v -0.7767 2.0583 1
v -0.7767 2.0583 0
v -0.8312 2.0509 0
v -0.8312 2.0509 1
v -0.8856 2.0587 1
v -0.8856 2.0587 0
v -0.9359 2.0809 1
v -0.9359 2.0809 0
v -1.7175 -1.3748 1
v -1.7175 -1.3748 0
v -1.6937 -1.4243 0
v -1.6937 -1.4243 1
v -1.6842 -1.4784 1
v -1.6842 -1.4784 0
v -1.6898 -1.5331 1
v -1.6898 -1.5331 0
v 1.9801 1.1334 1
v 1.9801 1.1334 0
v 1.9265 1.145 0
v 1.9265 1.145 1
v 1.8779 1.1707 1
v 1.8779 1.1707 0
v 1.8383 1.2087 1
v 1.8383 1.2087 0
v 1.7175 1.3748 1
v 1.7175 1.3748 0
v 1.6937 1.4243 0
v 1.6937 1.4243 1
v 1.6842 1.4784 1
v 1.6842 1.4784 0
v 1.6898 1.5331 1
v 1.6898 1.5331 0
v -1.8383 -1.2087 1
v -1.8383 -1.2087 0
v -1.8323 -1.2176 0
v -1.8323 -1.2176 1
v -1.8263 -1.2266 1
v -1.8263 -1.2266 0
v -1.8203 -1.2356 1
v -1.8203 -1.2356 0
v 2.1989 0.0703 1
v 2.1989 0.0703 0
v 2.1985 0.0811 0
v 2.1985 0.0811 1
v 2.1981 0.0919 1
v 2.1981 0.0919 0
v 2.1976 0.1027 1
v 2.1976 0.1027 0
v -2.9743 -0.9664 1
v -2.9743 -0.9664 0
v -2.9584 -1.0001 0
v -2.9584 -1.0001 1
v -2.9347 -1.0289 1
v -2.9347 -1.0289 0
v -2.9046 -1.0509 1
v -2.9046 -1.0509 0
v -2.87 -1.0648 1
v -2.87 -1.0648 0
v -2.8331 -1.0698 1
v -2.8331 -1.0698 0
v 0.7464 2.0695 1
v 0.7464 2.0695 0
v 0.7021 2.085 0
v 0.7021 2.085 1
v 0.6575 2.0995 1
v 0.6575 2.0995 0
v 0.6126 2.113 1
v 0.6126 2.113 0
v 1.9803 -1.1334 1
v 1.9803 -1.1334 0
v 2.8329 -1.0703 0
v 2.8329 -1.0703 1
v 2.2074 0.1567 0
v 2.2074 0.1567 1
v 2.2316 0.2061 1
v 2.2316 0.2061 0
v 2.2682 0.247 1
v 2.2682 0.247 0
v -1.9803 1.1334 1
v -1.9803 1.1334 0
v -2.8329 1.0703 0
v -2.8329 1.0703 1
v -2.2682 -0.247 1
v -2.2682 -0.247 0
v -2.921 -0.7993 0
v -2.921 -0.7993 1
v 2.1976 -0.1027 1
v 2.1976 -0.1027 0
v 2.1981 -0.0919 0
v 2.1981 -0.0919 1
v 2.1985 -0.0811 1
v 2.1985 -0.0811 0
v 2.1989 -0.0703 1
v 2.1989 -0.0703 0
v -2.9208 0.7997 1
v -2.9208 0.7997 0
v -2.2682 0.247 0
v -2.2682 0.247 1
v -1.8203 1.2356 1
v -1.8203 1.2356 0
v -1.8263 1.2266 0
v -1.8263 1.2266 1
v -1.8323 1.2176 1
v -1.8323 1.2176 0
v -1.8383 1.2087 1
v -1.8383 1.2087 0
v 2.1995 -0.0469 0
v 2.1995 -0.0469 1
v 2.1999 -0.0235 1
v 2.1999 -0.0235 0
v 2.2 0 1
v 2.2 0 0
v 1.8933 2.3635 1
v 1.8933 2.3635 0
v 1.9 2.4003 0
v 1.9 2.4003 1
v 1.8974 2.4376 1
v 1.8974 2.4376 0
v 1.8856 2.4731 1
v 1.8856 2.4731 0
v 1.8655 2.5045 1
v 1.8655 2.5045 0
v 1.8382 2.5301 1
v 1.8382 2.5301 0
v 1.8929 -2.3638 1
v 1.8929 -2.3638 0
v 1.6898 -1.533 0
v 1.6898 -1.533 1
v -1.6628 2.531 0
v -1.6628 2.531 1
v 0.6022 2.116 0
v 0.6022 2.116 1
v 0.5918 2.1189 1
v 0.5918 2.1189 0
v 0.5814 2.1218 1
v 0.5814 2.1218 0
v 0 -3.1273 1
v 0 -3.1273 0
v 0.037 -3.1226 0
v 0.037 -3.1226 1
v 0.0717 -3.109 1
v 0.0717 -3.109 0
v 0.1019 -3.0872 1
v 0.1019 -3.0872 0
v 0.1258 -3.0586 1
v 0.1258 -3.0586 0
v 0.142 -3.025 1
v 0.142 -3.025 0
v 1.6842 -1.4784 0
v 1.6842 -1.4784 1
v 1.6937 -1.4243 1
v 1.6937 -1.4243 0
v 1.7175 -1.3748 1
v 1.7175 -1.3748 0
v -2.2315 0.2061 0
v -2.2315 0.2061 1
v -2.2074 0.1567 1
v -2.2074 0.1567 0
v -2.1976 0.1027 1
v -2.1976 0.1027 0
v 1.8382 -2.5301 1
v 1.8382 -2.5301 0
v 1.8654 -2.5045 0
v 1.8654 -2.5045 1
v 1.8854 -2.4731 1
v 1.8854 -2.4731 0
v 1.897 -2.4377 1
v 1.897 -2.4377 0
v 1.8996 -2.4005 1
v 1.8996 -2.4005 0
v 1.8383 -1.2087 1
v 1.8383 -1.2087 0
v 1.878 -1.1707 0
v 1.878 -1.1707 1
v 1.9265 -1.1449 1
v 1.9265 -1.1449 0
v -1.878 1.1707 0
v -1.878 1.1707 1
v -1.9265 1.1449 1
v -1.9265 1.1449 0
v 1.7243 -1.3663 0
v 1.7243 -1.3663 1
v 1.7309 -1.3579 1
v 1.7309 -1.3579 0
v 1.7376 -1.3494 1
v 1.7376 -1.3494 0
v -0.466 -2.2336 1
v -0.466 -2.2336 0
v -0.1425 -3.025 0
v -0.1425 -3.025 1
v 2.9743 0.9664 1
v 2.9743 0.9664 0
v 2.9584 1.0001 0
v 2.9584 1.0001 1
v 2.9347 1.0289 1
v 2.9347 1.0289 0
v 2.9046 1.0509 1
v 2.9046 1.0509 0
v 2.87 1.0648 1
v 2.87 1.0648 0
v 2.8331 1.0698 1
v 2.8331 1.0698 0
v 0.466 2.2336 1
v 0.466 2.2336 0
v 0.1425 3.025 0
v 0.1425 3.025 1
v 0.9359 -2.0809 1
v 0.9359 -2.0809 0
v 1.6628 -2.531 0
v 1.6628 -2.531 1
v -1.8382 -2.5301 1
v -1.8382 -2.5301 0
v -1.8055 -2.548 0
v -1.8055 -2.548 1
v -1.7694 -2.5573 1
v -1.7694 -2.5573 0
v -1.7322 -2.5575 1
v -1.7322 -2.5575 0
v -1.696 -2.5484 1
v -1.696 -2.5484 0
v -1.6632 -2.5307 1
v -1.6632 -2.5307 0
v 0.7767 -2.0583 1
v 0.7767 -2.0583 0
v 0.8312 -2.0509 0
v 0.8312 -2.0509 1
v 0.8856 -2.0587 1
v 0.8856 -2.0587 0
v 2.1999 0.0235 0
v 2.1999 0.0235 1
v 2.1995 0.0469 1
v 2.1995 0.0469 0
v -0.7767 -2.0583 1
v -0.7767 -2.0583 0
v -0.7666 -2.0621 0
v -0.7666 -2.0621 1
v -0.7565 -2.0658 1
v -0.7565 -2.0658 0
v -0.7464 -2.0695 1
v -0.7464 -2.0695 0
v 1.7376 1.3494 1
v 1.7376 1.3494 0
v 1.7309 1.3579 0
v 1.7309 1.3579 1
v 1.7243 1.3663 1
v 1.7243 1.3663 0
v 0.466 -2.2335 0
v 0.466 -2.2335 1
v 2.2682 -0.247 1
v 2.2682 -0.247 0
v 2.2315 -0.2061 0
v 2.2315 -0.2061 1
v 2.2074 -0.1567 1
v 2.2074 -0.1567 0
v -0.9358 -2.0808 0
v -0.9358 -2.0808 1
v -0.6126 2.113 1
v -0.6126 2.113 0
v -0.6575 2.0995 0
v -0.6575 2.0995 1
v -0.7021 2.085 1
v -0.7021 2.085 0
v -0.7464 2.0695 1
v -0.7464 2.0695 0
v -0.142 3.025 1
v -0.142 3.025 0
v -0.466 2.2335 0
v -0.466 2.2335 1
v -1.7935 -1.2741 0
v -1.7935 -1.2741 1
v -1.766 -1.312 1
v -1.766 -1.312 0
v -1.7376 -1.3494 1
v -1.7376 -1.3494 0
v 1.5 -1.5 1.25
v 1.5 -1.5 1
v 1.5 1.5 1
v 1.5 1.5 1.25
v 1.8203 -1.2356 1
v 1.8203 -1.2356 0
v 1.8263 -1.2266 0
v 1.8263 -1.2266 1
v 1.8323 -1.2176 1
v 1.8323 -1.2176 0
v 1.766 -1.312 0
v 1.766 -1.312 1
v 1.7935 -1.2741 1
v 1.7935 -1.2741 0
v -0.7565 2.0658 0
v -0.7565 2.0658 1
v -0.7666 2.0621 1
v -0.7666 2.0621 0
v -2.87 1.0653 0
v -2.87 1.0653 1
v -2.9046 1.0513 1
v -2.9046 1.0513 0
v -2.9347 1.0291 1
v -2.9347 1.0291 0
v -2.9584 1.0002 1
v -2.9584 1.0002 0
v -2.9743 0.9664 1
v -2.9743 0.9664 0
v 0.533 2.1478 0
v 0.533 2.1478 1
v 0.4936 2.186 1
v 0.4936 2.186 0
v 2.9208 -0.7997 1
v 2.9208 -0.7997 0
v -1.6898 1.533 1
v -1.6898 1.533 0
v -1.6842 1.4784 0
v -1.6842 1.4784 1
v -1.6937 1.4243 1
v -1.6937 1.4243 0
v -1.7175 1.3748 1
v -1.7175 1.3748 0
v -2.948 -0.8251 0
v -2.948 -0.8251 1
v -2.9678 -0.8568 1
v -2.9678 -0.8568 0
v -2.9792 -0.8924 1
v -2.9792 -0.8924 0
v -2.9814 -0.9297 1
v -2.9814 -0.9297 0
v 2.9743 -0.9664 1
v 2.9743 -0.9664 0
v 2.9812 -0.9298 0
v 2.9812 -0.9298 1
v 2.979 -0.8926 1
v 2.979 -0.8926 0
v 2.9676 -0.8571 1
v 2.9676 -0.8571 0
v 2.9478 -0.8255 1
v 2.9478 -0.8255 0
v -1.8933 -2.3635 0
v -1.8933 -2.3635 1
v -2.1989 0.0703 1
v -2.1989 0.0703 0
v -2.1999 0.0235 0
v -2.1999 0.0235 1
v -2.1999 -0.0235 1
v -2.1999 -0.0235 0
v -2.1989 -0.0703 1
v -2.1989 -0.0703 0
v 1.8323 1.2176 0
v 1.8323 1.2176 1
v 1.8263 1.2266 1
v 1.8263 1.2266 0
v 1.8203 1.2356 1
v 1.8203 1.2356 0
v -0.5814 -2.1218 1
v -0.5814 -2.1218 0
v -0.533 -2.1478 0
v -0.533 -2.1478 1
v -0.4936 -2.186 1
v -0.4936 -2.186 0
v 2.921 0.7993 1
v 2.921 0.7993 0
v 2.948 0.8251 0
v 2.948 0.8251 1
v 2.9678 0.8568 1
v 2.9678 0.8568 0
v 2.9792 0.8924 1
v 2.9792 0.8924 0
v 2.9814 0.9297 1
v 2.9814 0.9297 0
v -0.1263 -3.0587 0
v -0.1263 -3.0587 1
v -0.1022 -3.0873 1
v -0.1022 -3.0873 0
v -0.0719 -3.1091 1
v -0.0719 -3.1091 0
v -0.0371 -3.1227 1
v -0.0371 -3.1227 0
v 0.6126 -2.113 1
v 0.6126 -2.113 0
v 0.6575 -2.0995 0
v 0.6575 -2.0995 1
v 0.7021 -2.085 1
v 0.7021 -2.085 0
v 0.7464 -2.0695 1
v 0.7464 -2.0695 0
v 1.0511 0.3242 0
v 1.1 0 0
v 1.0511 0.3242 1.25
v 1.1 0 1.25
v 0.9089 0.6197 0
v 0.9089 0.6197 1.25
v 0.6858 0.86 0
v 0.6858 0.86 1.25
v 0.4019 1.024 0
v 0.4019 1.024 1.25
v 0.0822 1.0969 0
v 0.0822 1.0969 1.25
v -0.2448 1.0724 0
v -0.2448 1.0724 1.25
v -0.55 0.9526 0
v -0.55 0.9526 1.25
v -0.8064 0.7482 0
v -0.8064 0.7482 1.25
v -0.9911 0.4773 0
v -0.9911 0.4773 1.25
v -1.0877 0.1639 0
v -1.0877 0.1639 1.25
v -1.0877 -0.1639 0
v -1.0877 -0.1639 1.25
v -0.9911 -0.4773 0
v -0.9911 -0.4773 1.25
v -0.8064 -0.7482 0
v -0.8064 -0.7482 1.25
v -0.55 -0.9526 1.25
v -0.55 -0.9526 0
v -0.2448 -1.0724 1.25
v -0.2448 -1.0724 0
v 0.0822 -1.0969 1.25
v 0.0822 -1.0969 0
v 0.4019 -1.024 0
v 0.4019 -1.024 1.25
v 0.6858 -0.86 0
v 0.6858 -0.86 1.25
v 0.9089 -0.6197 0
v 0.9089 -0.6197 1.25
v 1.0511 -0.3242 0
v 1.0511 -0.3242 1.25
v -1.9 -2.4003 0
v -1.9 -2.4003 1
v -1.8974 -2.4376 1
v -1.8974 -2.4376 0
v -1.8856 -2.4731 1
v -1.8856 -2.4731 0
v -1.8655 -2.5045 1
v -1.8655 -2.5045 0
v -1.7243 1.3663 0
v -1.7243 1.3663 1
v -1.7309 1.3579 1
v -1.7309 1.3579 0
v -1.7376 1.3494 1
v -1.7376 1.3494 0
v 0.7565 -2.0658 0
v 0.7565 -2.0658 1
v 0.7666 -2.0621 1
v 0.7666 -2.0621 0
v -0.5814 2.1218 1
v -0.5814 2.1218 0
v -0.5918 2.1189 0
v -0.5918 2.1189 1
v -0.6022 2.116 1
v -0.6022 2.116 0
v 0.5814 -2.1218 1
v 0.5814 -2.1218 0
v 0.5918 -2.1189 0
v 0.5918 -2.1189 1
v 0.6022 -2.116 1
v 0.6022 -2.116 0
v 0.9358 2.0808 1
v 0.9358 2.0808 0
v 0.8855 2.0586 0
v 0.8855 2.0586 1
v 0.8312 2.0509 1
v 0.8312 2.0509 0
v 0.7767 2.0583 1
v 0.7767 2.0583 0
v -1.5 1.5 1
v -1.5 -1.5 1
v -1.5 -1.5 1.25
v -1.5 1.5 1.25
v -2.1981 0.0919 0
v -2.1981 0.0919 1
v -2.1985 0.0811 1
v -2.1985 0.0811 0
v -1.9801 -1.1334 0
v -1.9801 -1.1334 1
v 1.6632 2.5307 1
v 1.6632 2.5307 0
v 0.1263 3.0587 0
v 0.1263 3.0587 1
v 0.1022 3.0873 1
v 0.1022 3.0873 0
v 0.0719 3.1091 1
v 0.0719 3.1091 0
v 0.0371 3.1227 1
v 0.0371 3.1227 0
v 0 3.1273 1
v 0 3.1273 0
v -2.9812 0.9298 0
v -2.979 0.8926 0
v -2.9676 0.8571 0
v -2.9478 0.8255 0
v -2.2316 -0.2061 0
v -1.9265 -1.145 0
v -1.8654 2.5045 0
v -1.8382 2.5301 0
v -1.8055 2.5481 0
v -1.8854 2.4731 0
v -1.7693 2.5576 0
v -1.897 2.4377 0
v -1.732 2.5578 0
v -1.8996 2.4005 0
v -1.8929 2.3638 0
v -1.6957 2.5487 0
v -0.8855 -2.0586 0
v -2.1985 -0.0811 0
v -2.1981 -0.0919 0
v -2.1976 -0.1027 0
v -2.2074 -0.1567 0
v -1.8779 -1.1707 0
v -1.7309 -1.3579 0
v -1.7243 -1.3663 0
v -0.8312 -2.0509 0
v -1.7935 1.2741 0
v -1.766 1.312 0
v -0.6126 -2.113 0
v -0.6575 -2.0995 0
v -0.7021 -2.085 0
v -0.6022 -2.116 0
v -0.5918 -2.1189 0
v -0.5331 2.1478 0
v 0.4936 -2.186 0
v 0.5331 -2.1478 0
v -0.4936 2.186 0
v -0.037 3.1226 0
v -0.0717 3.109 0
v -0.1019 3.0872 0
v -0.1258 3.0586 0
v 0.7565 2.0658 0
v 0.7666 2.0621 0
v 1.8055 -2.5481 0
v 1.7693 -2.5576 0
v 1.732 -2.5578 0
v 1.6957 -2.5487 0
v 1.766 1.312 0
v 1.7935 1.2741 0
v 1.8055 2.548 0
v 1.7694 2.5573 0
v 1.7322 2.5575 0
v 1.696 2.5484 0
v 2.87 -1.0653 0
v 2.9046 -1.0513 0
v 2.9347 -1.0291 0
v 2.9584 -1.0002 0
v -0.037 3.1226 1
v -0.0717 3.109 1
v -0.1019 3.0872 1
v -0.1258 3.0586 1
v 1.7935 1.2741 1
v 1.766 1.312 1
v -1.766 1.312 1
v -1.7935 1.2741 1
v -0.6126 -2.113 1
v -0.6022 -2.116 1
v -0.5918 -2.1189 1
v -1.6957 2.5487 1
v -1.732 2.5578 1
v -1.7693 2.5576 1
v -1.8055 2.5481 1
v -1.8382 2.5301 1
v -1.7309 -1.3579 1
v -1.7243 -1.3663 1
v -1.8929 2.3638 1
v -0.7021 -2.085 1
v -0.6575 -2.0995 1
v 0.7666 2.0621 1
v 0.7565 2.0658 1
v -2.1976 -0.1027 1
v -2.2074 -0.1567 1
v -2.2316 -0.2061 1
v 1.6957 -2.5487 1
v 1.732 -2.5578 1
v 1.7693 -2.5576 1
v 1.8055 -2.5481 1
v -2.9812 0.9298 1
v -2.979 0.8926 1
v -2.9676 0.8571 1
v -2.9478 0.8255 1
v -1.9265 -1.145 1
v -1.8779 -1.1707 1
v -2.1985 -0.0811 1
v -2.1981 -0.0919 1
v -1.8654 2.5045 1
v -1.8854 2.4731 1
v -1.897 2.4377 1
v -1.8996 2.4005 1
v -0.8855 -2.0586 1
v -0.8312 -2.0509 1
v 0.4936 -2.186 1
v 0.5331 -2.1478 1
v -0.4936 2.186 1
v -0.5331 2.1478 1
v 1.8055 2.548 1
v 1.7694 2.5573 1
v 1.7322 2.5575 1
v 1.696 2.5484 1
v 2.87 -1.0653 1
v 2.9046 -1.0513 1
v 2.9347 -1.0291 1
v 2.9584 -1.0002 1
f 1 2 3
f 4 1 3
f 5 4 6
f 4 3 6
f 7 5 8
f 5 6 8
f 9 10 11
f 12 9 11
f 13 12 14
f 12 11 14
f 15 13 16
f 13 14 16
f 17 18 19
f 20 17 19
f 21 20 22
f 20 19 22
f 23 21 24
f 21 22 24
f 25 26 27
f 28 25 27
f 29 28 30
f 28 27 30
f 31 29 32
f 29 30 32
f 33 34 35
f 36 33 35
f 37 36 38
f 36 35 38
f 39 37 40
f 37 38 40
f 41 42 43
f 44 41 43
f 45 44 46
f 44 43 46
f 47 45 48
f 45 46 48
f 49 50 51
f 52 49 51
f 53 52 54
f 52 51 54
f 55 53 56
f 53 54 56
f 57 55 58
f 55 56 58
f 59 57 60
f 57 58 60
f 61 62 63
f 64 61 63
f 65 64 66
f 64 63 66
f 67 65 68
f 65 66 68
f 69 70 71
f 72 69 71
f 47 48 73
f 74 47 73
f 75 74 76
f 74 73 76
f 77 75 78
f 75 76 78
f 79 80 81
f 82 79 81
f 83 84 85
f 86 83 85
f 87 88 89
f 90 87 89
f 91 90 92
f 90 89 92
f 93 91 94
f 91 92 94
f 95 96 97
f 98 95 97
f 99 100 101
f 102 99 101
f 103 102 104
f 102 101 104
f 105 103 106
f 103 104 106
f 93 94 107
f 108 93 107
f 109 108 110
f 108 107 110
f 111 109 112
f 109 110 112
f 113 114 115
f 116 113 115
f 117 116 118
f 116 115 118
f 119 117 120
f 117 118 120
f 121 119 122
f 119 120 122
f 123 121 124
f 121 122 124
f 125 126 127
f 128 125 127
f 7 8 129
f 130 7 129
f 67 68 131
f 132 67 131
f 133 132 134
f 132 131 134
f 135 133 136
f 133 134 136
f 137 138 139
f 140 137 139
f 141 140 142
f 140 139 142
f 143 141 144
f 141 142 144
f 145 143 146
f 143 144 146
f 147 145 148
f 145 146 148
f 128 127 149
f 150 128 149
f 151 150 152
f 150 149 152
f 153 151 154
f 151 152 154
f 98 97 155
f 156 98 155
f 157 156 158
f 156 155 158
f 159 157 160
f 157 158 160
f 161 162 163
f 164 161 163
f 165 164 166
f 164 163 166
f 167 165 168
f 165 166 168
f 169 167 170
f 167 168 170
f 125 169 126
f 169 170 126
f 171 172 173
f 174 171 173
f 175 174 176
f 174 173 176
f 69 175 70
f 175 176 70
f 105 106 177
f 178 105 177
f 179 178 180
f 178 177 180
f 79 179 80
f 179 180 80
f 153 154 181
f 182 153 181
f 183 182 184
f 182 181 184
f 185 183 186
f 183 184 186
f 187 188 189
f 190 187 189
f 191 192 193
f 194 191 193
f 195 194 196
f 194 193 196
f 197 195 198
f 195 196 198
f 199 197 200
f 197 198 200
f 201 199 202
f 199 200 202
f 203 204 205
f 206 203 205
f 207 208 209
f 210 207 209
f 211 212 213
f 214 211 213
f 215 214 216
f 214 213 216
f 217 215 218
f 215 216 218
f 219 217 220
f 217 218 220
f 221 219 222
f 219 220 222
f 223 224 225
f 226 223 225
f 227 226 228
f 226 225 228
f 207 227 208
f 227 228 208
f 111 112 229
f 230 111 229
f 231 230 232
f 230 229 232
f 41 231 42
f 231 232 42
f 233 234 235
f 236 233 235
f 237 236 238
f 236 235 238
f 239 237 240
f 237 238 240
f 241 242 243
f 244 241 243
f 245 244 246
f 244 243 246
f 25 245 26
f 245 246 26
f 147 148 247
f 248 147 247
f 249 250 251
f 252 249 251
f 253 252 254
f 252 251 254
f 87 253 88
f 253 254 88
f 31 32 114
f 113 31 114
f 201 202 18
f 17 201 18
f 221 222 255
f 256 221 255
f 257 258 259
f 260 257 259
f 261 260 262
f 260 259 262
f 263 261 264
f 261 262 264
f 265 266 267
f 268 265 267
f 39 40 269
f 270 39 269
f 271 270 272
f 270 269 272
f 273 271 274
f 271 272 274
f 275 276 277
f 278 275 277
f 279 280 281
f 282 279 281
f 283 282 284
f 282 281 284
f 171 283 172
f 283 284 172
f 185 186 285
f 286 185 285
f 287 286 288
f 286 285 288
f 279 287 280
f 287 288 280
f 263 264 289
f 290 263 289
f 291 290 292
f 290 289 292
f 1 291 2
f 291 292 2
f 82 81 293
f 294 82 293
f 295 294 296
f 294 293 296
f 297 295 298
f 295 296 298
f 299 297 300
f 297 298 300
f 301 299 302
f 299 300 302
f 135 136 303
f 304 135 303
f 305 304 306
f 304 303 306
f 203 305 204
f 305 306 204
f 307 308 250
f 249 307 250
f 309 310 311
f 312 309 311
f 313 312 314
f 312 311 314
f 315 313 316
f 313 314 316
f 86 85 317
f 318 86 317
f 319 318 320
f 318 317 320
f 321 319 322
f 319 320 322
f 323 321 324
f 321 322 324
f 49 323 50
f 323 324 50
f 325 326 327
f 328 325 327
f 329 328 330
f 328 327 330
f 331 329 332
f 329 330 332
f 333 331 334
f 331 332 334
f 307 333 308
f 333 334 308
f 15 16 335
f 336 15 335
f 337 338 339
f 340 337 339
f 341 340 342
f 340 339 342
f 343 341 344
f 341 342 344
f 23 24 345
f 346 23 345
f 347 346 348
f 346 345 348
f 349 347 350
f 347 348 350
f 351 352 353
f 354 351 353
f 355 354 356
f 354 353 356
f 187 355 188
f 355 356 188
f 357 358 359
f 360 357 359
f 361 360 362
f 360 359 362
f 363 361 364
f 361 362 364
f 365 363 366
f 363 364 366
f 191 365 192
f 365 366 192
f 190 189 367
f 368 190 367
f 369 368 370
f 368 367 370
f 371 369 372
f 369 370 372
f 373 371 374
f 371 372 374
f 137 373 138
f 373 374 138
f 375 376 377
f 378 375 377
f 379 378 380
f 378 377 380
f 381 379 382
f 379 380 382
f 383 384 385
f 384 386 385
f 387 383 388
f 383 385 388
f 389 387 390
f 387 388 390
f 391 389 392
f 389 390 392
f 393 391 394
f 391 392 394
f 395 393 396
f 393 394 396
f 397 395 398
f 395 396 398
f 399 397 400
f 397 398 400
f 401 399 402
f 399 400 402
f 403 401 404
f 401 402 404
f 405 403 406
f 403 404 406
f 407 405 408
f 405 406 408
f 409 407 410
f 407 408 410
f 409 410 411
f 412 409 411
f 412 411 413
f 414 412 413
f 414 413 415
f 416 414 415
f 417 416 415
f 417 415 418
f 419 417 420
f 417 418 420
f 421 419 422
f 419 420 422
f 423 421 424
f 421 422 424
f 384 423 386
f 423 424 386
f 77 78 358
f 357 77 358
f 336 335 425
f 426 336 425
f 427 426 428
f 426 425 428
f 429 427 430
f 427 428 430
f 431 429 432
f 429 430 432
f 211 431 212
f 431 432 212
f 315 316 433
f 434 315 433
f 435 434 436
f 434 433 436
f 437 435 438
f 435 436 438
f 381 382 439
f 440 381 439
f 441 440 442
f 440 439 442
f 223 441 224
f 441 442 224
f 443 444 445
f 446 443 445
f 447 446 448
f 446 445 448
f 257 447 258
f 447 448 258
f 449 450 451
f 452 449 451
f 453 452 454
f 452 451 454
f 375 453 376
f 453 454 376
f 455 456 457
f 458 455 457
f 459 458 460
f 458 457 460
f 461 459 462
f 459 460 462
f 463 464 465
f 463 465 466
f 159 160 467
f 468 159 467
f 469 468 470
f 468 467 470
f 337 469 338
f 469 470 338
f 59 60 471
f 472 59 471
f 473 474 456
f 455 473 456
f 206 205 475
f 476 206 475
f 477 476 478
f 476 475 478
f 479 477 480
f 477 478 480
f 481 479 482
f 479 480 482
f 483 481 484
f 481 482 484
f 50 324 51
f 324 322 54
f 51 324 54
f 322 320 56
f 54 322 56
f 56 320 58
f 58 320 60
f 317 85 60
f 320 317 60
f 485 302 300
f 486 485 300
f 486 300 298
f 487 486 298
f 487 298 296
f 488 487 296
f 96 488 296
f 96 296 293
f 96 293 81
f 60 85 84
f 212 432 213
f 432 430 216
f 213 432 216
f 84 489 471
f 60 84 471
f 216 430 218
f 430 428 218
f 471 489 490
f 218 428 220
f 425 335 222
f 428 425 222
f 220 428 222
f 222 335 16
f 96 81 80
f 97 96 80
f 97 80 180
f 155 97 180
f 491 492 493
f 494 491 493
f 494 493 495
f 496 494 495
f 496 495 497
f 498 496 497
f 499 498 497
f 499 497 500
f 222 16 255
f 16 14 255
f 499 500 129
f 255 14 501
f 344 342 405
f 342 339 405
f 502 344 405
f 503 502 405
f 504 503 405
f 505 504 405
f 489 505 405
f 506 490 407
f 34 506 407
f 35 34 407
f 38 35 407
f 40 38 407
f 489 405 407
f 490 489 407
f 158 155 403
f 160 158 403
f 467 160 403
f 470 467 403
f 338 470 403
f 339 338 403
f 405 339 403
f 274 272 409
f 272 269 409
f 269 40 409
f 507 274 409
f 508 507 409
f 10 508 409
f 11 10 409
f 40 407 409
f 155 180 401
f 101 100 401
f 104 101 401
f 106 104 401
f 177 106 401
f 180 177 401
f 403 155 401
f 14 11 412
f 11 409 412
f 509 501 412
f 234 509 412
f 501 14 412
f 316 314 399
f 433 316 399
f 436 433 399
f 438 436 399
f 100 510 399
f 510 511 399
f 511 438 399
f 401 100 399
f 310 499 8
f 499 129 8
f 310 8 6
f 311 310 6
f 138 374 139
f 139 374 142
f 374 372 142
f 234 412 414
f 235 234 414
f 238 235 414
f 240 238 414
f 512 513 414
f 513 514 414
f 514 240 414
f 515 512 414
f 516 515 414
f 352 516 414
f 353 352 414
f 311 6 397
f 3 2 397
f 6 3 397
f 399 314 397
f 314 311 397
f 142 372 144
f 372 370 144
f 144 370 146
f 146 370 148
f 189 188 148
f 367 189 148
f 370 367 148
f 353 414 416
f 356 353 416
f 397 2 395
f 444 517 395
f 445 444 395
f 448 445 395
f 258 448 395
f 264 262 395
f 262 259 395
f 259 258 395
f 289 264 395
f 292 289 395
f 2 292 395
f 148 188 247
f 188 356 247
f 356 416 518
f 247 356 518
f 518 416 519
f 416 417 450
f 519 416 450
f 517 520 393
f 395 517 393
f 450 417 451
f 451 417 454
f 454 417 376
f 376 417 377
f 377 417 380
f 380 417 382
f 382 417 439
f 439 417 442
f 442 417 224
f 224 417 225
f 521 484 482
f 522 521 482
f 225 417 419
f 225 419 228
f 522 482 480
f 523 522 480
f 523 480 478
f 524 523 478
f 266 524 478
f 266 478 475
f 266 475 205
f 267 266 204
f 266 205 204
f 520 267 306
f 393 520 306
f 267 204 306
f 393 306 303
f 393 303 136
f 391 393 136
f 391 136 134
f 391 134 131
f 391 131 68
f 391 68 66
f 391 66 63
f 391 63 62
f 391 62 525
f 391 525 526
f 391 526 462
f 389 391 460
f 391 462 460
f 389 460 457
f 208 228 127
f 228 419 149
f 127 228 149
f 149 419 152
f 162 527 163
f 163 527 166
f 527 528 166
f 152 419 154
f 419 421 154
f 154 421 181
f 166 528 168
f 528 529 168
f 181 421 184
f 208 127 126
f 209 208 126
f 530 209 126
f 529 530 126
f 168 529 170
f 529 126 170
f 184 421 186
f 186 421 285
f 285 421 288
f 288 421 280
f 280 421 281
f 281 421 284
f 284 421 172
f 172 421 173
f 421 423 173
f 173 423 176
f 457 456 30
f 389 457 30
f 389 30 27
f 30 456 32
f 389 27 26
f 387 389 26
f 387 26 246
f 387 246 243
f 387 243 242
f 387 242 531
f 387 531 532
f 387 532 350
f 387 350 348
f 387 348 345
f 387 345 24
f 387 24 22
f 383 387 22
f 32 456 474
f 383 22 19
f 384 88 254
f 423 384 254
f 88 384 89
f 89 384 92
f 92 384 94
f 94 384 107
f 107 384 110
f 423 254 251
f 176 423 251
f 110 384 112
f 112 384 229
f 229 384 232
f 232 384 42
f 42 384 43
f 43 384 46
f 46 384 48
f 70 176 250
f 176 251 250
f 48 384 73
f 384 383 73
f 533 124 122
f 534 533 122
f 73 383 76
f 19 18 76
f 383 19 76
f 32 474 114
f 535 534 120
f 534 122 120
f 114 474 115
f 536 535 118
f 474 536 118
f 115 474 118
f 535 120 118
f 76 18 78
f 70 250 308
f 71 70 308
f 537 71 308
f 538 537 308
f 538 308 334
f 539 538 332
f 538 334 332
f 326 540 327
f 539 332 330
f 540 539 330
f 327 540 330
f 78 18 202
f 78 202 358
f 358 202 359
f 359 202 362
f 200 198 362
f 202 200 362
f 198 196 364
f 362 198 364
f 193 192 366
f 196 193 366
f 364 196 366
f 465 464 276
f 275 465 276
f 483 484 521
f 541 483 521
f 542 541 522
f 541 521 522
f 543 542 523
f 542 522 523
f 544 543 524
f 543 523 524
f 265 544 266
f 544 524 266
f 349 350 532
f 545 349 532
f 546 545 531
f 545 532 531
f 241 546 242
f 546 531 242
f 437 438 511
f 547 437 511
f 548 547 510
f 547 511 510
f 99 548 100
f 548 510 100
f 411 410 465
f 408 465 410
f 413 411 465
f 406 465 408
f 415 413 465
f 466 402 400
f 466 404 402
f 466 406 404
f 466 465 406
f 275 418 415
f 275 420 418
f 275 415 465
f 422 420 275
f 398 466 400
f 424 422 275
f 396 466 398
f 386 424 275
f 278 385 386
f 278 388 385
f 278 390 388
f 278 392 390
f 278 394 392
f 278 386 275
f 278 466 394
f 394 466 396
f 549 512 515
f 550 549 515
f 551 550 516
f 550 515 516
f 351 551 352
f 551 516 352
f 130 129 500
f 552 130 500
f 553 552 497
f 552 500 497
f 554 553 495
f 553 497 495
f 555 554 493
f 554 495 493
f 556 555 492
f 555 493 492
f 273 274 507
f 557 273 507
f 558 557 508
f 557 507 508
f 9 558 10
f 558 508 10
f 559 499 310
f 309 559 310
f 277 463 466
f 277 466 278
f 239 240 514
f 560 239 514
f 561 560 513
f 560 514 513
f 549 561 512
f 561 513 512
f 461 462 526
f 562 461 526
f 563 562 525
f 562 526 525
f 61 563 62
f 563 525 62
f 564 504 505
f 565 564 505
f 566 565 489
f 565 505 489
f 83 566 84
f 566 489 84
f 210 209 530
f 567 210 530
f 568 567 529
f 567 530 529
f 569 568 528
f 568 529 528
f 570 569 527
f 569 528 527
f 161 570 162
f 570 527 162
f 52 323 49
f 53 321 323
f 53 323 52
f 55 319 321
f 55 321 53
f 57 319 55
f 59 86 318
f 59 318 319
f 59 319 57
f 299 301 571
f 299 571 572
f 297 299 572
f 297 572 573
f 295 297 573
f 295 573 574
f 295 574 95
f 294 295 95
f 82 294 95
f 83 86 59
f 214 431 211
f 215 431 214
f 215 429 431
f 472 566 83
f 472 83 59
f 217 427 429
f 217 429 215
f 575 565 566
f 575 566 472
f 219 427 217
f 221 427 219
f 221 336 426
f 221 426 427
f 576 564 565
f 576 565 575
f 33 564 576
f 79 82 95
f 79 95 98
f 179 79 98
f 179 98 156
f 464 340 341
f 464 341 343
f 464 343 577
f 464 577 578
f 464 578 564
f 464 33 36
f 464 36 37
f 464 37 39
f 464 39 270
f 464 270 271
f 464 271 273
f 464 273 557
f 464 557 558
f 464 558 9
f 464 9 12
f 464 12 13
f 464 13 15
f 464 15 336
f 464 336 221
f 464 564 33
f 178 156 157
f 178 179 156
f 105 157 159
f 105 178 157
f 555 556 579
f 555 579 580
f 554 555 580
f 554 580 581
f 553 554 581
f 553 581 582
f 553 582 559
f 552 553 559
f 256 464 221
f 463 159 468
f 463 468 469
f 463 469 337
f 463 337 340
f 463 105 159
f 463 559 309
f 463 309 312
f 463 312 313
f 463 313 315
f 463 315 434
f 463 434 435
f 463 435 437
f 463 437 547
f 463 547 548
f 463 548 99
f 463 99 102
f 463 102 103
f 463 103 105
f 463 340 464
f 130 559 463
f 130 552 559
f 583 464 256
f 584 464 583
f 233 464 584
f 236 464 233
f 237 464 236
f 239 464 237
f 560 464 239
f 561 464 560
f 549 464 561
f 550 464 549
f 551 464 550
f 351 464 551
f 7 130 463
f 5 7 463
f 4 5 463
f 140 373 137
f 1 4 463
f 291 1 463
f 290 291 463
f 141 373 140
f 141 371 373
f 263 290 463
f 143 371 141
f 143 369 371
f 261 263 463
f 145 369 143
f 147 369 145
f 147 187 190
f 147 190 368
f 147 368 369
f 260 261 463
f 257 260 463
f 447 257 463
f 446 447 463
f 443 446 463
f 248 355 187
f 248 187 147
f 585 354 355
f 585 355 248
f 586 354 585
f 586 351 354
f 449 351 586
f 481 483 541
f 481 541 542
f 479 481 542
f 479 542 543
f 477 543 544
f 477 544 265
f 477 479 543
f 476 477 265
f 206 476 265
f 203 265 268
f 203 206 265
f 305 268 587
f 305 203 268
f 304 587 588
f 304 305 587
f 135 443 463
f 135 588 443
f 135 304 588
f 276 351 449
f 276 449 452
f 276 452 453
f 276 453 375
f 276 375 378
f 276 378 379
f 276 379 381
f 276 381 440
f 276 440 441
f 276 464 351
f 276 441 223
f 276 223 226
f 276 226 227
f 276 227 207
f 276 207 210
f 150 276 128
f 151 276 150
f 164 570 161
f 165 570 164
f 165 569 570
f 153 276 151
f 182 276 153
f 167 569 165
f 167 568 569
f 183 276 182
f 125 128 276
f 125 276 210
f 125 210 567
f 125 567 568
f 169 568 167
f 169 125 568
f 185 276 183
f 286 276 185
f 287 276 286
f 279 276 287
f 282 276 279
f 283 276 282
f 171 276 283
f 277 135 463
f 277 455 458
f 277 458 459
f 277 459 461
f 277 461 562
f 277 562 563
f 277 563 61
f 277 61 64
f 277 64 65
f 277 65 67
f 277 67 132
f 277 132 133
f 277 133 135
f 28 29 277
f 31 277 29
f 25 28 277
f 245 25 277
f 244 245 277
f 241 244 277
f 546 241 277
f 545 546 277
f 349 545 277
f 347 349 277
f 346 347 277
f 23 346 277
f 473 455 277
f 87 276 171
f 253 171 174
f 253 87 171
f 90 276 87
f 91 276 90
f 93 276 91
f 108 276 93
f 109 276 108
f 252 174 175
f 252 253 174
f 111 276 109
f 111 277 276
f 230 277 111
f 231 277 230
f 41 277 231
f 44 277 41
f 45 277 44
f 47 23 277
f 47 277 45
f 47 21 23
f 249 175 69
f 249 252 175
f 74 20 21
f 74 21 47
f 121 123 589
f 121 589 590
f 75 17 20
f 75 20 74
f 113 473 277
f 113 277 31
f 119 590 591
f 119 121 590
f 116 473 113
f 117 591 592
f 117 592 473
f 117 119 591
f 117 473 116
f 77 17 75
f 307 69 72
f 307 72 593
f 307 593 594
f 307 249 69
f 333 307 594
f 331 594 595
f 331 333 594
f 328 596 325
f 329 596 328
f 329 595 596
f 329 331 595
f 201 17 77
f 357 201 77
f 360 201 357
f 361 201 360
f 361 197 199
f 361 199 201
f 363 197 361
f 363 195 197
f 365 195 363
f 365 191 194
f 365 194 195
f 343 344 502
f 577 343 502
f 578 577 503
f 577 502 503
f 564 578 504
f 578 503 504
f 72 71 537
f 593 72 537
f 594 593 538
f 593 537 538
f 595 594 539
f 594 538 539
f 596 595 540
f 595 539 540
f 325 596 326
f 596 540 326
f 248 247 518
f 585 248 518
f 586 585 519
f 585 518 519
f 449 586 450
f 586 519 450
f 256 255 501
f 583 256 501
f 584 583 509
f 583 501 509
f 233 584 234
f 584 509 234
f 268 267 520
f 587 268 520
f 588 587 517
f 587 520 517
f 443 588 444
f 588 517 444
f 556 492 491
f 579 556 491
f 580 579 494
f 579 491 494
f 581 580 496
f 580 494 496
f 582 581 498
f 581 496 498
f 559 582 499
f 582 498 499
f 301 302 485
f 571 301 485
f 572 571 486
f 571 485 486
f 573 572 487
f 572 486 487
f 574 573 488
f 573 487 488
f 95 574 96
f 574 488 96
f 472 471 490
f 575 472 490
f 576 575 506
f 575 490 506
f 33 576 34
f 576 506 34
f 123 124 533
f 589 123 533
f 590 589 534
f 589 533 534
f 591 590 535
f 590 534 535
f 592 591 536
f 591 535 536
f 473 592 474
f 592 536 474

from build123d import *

# Parameters (mm, degrees)
F1_DEPTH        = 1
F1_COPIES_COUNT = 10
F3_W            = 3
F3_H            = 3
F4_DEPTH        = 0.25
F5_DEPTH        = 1
F6_DEPTH        = 0.25
F7_R            = 1.1
F8_DEPTH        = 12.5


# Not quite as in the source:
# - ends of sketch curves that miss each other by under 0.0002 mm in the source are joined
# - a feature of the source that left no trace in its solid (it failed there, or was rolled back) is left out
# - a pattern or mirror of a feature is missing from the dataset's text; its kind, count and spacing are read off the source's solid


with BuildPart() as f1:
    # F0 (on Top) → F1 (new body)
    with BuildSketch(Plane.XY):
        with BuildLine():
            ThreePointArc((0.581444512, 2.1217733808), (0.2933415776, 2.1803556405), (0, 2.2))
            ThreePointArc((0, 2.2), (-0.2933416878, 2.1803556256), (-0.5814447265, 2.121773322))
            ThreePointArc((-0.5814447265, 2.121773322), (-0.5968372157, 2.1167523736), (-0.6125853979, 2.1129929319))
            ThreePointArc((-0.6125853979, 2.1129929319), (-1.3214219849, -1.7589326132), (2.2, 0))
            ThreePointArc((2.2, 0), (1.7589325969, 1.3214220066), (0.612585346, 2.112992947))
            ThreePointArc((0.6125853416, 2.1129929319), (0.5968370782, 2.1167523965), (0.581444512, 2.1217733808))
        make_face()
        with BuildLine():
            ThreePointArc((0.6, 0.8), (0, -1), (-0.6, 0.8))
            Line((-0.6, 0.8), (0, 0.8))
            Line((0, 0.8), (0.6, 0.8))
        make_face(mode=Mode.SUBTRACT)
        with BuildLine():
            ThreePointArc((-0.5814447265, 2.121773322), (-0.2933416878, 2.1803556256), (0, 2.2))
            Line((0, 2.2), (0, 2.8273255734))
            ThreePointArc((0, 2.8273255734), (-0.1215931939, 2.889819495), (-0.1419835484, 3.0250031792))
            Line((-0.1419835484, 3.0250031792), (-0.4660251262, 2.233467269))
            ThreePointArc((-0.4660251262, 2.233467269), (-0.5120300634, 2.1655250062), (-0.5814447265, 2.121773322))
        make_face()
        with BuildLine():
            Line((0, 2.8273255734), (0, 2.2))
            ThreePointArc((0, 2.2), (0.2933415776, 2.1803556405), (0.581444512, 2.1217733808))
            ThreePointArc((0.581444512, 2.1217733808), (0.5119904355, 2.165563311), (0.4659834267, 2.2335690598))
            Line((0.4659834267, 2.2335690598), (0.1424618925, 3.0249932315))
            ThreePointArc((0.1424618925, 3.0249932315), (0.1482808399, 3.0014743175), (0.1502375048, 2.9773253853))
            ThreePointArc((0.1502375048, 2.9773253853), (0.1062195181, 2.8711754307), (0, 2.8273255734))
        make_face()
        with BuildLine():
            ThreePointArc((-0.1419835484, 3.0250031792), (-0.1215931939, 2.889819495), (0, 2.8273255734))
            Line((0, 2.8273255734), (0, 3.1273251973))
            ThreePointArc((0, 3.1273251973), (-0.0874611784, 3.0990173775), (-0.1419835484, 3.0250031792))
        make_face()
        with BuildLine():
            Line((0, 3.1273251973), (0, 2.8273255734))
            ThreePointArc((0, 2.8273255734), (0.1062195181, 2.8711754307), (0.1502375048, 2.9773253853))
            ThreePointArc((0.1502375048, 2.9773253853), (0.1482808399, 3.0014743175), (0.1424618925, 3.0249932315))
            ThreePointArc((0.1424618925, 3.0249932315), (0.0877476558, 3.0991530237), (0, 3.1273251973))
        make_face()
        with BuildLine():
            ThreePointArc((0.612585346, 2.112992947), (0.5970310708, 2.1174404125), (0.581444512, 2.1217733808))
            ThreePointArc((0.581444512, 2.1217733808), (0.5968370782, 2.1167523965), (0.6125853416, 2.1129929319))
        make_face()
        with BuildLine():
            ThreePointArc((-0.6125853979, 2.1129929319), (-0.5968372157, 2.1167523736), (-0.5814447265, 2.121773322))
            ThreePointArc((-0.5814447265, 2.121773322), (-0.5970312038, 2.117440375), (-0.6125853979, 2.1129929319))
        make_face()
    extrude(amount=F1_DEPTH)

    # F1_copies: F1 ×10 about axis
    f1_copies_axis = Axis((0, 0, 0), (0, 0, 1))


with BuildPart() as f1_1:
    add(f1.part)
    for i in range(1, F1_COPIES_COUNT):
        add(f1.part.rotate(f1_copies_axis, i * 360 / F1_COPIES_COUNT))

    # F3 (on face) → F4 (cut)
    with BuildSketch(Plane.XY.offset(1)):
        Rectangle(F3_W, F3_H)
    extrude(amount=-F4_DEPTH, mode=Mode.SUBTRACT)

    # F0 (on Top) → F5 (join)
    with BuildSketch(Plane.XY):
        with BuildLine():
            ThreePointArc((0.581444512, 2.1217733808), (0.2933415776, 2.1803556405), (0, 2.2))
            ThreePointArc((0, 2.2), (-0.2933416878, 2.1803556256), (-0.5814447265, 2.121773322))
            ThreePointArc((-0.5814447265, 2.121773322), (-0.5968372157, 2.1167523736), (-0.6125853979, 2.1129929319))
            ThreePointArc((-0.6125853979, 2.1129929319), (-1.3214219849, -1.7589326132), (2.2, 0))
            ThreePointArc((2.2, 0), (1.7589325969, 1.3214220066), (0.612585346, 2.112992947))
            ThreePointArc((0.6125853416, 2.1129929319), (0.5968370782, 2.1167523965), (0.581444512, 2.1217733808))
        make_face()
        with BuildLine():
            ThreePointArc((0.6, 0.8), (0, -1), (-0.6, 0.8))
            Line((-0.6, 0.8), (0, 0.8))
            Line((0, 0.8), (0.6, 0.8))
        make_face(mode=Mode.SUBTRACT)
        with BuildLine():
            ThreePointArc((-0.5814447265, 2.121773322), (-0.2933416878, 2.1803556256), (0, 2.2))
            Line((0, 2.2), (0, 2.8273255734))
            ThreePointArc((0, 2.8273255734), (-0.1215931939, 2.889819495), (-0.1419835484, 3.0250031792))
            Line((-0.1419835484, 3.0250031792), (-0.4660251262, 2.233467269))
            ThreePointArc((-0.4660251262, 2.233467269), (-0.5120300634, 2.1655250062), (-0.5814447265, 2.121773322))
        make_face()
        with BuildLine():
            Line((0, 2.8273255734), (0, 2.2))
            ThreePointArc((0, 2.2), (0.2933415776, 2.1803556405), (0.581444512, 2.1217733808))
            ThreePointArc((0.581444512, 2.1217733808), (0.5119904355, 2.165563311), (0.4659834267, 2.2335690598))
            Line((0.4659834267, 2.2335690598), (0.1424618925, 3.0249932315))
            ThreePointArc((0.1424618925, 3.0249932315), (0.1482808399, 3.0014743175), (0.1502375048, 2.9773253853))
            ThreePointArc((0.1502375048, 2.9773253853), (0.1062195181, 2.8711754307), (0, 2.8273255734))
        make_face()
        with BuildLine():
            ThreePointArc((-0.1419835484, 3.0250031792), (-0.1215931939, 2.889819495), (0, 2.8273255734))
            Line((0, 2.8273255734), (0, 3.1273251973))
            ThreePointArc((0, 3.1273251973), (-0.0874611784, 3.0990173775), (-0.1419835484, 3.0250031792))
        make_face()
        with BuildLine():
            Line((0, 3.1273251973), (0, 2.8273255734))
            ThreePointArc((0, 2.8273255734), (0.1062195181, 2.8711754307), (0.1502375048, 2.9773253853))
            ThreePointArc((0.1502375048, 2.9773253853), (0.1482808399, 3.0014743175), (0.1424618925, 3.0249932315))
            ThreePointArc((0.1424618925, 3.0249932315), (0.0877476558, 3.0991530237), (0, 3.1273251973))
        make_face()
        with BuildLine():
            ThreePointArc((0.612585346, 2.112992947), (0.5970310708, 2.1174404125), (0.581444512, 2.1217733808))
            ThreePointArc((0.581444512, 2.1217733808), (0.5968370782, 2.1167523965), (0.6125853416, 2.1129929319))
        make_face()
        with BuildLine():
            ThreePointArc((-0.6125853979, 2.1129929319), (-0.5968372157, 2.1167523736), (-0.5814447265, 2.121773322))
            ThreePointArc((-0.5814447265, 2.121773322), (-0.5970312038, 2.117440375), (-0.6125853979, 2.1129929319))
        make_face()
    extrude(amount=F5_DEPTH)

    # F3 (on face) → F6 (join)
    with BuildSketch(Plane.XY.offset(1)):
        Rectangle(F3_W, F3_H)
        Polygon((-0.259935757, 0.8), (0.259935757, 0.8), (0.6805206467, 0.494427191), (0.8411697794, 0), (0.6805206467, -0.494427191), (0.259935757, -0.8), (-0.259935757, -0.8), (-0.6805206467, -0.494427191), (-0.8411697794, 0), (-0.6805206467, 0.494427191), align=None, mode=Mode.SUBTRACT)
    extrude(amount=F6_DEPTH)

    # F7 (on face) → F8 (cut, symmetric)
    with BuildSketch(Plane.XY.offset(1)):
        Circle(F7_R)
    extrude(amount=F8_DEPTH, both=True, mode=Mode.SUBTRACT)


solid = f1_1.part
